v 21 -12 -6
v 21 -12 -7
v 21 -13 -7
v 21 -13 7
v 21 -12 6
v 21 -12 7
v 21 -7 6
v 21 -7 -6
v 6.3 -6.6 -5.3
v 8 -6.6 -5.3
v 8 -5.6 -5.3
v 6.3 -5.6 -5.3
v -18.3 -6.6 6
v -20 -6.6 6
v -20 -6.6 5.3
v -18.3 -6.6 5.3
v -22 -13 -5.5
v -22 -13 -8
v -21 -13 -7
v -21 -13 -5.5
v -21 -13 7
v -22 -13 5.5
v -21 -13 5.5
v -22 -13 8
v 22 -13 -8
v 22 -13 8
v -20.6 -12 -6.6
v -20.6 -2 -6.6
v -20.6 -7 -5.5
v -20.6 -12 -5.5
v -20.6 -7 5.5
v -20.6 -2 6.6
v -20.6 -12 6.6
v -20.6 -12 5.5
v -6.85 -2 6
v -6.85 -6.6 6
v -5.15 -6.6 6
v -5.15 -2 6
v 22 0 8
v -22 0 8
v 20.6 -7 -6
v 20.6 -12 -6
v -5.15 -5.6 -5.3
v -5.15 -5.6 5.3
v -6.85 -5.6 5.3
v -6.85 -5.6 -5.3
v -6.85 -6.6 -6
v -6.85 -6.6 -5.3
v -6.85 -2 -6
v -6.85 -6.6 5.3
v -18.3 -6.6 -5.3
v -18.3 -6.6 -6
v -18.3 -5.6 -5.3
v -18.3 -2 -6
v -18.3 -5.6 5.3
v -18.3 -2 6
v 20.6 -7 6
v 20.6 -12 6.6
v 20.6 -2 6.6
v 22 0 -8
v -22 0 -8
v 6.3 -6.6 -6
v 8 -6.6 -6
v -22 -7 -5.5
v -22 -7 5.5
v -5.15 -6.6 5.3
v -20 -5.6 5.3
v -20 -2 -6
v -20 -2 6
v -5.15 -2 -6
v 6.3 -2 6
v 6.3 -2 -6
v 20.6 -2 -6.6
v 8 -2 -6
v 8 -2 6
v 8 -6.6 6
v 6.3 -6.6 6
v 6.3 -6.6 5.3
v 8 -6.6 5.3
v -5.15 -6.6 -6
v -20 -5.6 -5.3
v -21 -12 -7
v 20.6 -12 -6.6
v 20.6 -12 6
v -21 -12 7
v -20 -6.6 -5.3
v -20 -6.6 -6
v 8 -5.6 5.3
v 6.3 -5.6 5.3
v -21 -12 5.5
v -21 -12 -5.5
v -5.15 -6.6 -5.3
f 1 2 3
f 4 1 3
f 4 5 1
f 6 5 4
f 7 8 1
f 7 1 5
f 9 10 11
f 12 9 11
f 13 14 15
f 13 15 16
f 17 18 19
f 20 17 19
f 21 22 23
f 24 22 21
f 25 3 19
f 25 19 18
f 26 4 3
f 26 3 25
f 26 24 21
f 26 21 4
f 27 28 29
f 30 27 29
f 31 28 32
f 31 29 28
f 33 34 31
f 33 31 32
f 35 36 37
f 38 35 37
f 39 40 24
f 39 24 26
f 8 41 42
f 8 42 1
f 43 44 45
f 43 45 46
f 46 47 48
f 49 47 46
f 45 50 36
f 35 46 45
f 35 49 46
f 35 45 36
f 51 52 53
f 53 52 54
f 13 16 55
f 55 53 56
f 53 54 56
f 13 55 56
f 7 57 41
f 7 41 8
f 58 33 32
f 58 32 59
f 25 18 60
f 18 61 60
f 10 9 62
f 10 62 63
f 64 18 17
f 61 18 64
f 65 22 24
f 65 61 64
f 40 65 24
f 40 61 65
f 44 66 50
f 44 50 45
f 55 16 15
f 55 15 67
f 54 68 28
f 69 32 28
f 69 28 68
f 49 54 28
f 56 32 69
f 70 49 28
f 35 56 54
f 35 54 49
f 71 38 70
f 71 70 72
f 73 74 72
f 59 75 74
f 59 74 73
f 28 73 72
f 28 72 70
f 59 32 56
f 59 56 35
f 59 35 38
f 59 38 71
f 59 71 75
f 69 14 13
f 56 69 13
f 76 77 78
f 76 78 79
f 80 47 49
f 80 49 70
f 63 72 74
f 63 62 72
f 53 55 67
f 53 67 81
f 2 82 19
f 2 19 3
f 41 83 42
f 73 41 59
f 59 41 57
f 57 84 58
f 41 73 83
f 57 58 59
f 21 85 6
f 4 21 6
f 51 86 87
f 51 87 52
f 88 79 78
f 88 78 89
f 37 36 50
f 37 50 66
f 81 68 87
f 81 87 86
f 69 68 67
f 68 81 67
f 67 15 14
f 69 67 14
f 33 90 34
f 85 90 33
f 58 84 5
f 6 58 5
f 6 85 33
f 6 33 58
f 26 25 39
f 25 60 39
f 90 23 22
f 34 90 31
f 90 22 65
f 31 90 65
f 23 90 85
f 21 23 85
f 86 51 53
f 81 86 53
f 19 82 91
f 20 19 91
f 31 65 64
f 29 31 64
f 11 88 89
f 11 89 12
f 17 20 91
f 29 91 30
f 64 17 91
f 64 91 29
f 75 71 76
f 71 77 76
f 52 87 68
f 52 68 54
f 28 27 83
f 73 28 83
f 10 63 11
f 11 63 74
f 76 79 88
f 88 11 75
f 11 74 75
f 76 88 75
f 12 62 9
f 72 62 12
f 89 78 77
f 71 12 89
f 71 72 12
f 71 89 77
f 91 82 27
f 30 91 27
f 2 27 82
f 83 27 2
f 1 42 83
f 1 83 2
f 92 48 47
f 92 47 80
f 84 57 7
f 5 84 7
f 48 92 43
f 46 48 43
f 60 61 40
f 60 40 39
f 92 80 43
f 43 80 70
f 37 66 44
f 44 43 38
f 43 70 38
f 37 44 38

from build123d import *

# Parameters (mm, degrees)
SKETCH_1_W                             = 44
SKETCH_1_H                             = 16
EXTRUDE_1_DEPTH                        = 2
SKETCH_2_W                             = 44
SKETCH_2_H                             = 16
SKETCH_2_W_2                           = 40
SKETCH_2_H_2                           = 12
EXTRUDE_2_DEPTH                        = 10
SKETCH_3_W                             = 5.5
SKETCH_3_H                             = 4
CUT_EXTRUDE_1_DEPTH                    = 2
SKETCH_4_W                             = 1.7
SKETCH_4_H                             = 12
EXTRUDE_4_DEPTH                        = 4.6
SKETCH_9_W                             = 44
SKETCH_9_H                             = 16
SKETCH_9_W_2                           = 42
SKETCH_9_H_2                           = 14
EXTRUDE_5_DEPTH                        = 1
SKETCH_12_W                            = 1
SKETCH_12_H                            = 12
CUT_EXTRUDE_3_DEPTH                    = 5
SKETCH_13_W                            = 41.2
SKETCH_13_H                            = 13.2
SKETCH_13_W_2                          = 40
SKETCH_13_H_2                          = 12
REVB_ASSEMBLYCLEARANCE_41P2X13P2_DEPTH = 11
SKETCH_14_W                            = 11
SKETCH_14_H                            = 7
REVB_USB_TOPLOADING_USLOT_DEPTH        = 2.1
SKETCH_17_W                            = 10.6
SKETCH_17_H                            = 1.01
REVB_UNDERSIDESOLDERRELIEF_1MM_DEPTH   = 28


with BuildPart() as part:
    # 草图1 → 凸台-拉伸1 (new body)
    with BuildSketch(Plane(origin=(0, 0, 0), x_dir=(1, 0, 0), z_dir=(0, 1, 0))):
        Rectangle(SKETCH_1_W, SKETCH_1_H)
    extrude(amount=-EXTRUDE_1_DEPTH)

    # 草图2 → 凸台-拉伸2 (add)
    with BuildSketch(Plane.XZ.offset(2)):
        Rectangle(SKETCH_2_W, SKETCH_2_H)
        Rectangle(SKETCH_2_W_2, SKETCH_2_H_2, mode=Mode.SUBTRACT)
    extrude(amount=EXTRUDE_2_DEPTH)

    # 草图3 → 切除-拉伸1 (cut)
    with BuildSketch(Plane.ZY.offset(22)):
        with Locations((2.75, -9)):
            Rectangle(SKETCH_3_W, SKETCH_3_H)
        with Locations((-2.75, -9)):
            Rectangle(SKETCH_3_W, SKETCH_3_H)
    extrude(amount=-CUT_EXTRUDE_1_DEPTH, mode=Mode.SUBTRACT)

    # 草图4 → 凸台-拉伸4 (add)
    with BuildSketch(Plane.XZ.offset(2)):
        with Locations((7.15, 0)):
            Rectangle(SKETCH_4_W, SKETCH_4_H)
        with Locations((-19.15, 0)):
            Rectangle(SKETCH_4_W, SKETCH_4_H)
        with Locations((-6, 0)):
            Rectangle(SKETCH_4_W, SKETCH_4_H)
    extrude(amount=EXTRUDE_4_DEPTH)

    # 草图9 → 凸台-拉伸5 (add)
    with BuildSketch(Plane.XZ.offset(12)):
        Rectangle(SKETCH_9_W, SKETCH_9_H)
        Rectangle(SKETCH_9_W_2, SKETCH_9_H_2, mode=Mode.SUBTRACT)
    extrude(amount=EXTRUDE_5_DEPTH)

    # 草图12 → 切除-拉伸3 (cut)
    with BuildSketch(Plane.XZ.offset(12)):
        with Locations((20.5, 0)):
            Rectangle(SKETCH_12_W, SKETCH_12_H)
    extrude(amount=-CUT_EXTRUDE_3_DEPTH, mode=Mode.SUBTRACT)

    # 草图13 → RevB_AssemblyClearance_41p2x13p2 (cut)
    with BuildSketch(Plane.XZ.offset(13)):
        Rectangle(SKETCH_13_W, SKETCH_13_H)
        Rectangle(SKETCH_13_W_2, SKETCH_13_H_2, mode=Mode.SUBTRACT)
    extrude(amount=-REVB_ASSEMBLYCLEARANCE_41P2X13P2_DEPTH, mode=Mode.SUBTRACT)

    # 草图14 → RevB_USB_TopLoading_Uslot (cut)
    with BuildSketch(Plane.ZY.offset(22)):
        with Locations((0, -10.5)):
            Rectangle(SKETCH_14_W, SKETCH_14_H)
    extrude(amount=-REVB_USB_TOPLOADING_USLOT_DEPTH, mode=Mode.SUBTRACT)

    # 草图17 → RevB_UndersideSolderRelief_1mm (cut)
    with BuildSketch(Plane(origin=(8, 0, 0), x_dir=(0, 0, -1), z_dir=(1, 0, 0))):
        with Locations((0, -6.105)):
            Rectangle(SKETCH_17_W, SKETCH_17_H)
    extrude(amount=-REVB_UNDERSIDESOLDERRELIEF_1MM_DEPTH, mode=Mode.SUBTRACT)


solid = part.part
